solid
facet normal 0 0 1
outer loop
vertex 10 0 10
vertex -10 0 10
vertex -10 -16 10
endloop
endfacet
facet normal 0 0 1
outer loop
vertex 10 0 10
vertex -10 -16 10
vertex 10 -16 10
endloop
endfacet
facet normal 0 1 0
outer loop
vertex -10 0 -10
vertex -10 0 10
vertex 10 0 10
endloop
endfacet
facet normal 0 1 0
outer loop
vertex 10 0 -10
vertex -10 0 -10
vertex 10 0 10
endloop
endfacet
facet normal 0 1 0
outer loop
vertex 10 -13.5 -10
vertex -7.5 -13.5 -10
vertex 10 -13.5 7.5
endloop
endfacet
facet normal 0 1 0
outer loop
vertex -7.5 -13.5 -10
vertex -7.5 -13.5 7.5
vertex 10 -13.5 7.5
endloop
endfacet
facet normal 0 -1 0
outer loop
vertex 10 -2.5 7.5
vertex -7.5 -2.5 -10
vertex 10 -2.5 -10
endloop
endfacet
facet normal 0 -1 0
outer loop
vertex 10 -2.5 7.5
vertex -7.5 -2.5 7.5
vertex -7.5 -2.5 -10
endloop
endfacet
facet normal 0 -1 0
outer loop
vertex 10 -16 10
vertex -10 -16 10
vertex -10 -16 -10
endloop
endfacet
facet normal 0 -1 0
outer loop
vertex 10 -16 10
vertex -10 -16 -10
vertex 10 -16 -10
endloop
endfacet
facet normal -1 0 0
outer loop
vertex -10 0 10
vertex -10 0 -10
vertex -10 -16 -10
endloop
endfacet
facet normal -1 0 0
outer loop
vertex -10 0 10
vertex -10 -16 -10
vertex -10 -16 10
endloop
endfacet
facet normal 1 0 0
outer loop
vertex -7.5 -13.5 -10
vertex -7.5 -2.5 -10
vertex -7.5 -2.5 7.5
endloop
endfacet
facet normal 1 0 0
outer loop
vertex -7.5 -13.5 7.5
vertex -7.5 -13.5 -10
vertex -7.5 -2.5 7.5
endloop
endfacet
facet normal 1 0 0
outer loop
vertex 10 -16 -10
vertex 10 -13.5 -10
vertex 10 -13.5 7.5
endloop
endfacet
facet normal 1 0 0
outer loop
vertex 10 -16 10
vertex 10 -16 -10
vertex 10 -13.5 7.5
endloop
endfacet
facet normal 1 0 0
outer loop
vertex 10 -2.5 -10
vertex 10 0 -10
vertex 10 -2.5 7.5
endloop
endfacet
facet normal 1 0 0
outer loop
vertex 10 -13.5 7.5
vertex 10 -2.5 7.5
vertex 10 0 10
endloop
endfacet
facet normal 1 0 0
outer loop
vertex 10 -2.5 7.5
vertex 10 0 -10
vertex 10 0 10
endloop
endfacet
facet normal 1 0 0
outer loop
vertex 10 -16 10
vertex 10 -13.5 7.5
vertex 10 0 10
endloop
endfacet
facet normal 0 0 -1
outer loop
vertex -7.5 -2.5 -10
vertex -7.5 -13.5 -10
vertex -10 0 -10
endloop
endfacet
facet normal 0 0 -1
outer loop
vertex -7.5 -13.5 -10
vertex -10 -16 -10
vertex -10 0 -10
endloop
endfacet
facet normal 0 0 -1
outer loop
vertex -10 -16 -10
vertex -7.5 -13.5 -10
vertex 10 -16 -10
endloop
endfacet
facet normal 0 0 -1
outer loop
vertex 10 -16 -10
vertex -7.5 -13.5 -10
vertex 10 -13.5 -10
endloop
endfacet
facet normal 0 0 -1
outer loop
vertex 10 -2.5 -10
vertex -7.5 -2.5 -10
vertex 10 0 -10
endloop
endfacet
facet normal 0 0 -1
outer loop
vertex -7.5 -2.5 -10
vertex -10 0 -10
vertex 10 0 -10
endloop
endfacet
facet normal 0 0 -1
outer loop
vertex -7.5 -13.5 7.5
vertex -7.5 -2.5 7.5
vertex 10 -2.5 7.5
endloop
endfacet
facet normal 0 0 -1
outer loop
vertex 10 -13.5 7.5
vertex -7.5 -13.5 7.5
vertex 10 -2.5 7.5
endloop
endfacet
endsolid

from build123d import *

# Parameters (mm, degrees)
F0_W     = 20
F0_H     = 20
F1_DEPTH = 16
F2_T     = -2.5


with BuildPart() as f1:
    # F0 (on Front) → F1 (new body)
    with BuildSketch(Plane.XZ):
        Rectangle(F0_W, F0_H)
    extrude(amount=F1_DEPTH)

    # F2
    f2_openings = [f1.faces().sort_by_distance(p)[0] for p in [
        (0, -8, -10),
        (10, -8, 0),
    ]]
    offset(amount=F2_T, openings=f2_openings)


solid = f1.part
